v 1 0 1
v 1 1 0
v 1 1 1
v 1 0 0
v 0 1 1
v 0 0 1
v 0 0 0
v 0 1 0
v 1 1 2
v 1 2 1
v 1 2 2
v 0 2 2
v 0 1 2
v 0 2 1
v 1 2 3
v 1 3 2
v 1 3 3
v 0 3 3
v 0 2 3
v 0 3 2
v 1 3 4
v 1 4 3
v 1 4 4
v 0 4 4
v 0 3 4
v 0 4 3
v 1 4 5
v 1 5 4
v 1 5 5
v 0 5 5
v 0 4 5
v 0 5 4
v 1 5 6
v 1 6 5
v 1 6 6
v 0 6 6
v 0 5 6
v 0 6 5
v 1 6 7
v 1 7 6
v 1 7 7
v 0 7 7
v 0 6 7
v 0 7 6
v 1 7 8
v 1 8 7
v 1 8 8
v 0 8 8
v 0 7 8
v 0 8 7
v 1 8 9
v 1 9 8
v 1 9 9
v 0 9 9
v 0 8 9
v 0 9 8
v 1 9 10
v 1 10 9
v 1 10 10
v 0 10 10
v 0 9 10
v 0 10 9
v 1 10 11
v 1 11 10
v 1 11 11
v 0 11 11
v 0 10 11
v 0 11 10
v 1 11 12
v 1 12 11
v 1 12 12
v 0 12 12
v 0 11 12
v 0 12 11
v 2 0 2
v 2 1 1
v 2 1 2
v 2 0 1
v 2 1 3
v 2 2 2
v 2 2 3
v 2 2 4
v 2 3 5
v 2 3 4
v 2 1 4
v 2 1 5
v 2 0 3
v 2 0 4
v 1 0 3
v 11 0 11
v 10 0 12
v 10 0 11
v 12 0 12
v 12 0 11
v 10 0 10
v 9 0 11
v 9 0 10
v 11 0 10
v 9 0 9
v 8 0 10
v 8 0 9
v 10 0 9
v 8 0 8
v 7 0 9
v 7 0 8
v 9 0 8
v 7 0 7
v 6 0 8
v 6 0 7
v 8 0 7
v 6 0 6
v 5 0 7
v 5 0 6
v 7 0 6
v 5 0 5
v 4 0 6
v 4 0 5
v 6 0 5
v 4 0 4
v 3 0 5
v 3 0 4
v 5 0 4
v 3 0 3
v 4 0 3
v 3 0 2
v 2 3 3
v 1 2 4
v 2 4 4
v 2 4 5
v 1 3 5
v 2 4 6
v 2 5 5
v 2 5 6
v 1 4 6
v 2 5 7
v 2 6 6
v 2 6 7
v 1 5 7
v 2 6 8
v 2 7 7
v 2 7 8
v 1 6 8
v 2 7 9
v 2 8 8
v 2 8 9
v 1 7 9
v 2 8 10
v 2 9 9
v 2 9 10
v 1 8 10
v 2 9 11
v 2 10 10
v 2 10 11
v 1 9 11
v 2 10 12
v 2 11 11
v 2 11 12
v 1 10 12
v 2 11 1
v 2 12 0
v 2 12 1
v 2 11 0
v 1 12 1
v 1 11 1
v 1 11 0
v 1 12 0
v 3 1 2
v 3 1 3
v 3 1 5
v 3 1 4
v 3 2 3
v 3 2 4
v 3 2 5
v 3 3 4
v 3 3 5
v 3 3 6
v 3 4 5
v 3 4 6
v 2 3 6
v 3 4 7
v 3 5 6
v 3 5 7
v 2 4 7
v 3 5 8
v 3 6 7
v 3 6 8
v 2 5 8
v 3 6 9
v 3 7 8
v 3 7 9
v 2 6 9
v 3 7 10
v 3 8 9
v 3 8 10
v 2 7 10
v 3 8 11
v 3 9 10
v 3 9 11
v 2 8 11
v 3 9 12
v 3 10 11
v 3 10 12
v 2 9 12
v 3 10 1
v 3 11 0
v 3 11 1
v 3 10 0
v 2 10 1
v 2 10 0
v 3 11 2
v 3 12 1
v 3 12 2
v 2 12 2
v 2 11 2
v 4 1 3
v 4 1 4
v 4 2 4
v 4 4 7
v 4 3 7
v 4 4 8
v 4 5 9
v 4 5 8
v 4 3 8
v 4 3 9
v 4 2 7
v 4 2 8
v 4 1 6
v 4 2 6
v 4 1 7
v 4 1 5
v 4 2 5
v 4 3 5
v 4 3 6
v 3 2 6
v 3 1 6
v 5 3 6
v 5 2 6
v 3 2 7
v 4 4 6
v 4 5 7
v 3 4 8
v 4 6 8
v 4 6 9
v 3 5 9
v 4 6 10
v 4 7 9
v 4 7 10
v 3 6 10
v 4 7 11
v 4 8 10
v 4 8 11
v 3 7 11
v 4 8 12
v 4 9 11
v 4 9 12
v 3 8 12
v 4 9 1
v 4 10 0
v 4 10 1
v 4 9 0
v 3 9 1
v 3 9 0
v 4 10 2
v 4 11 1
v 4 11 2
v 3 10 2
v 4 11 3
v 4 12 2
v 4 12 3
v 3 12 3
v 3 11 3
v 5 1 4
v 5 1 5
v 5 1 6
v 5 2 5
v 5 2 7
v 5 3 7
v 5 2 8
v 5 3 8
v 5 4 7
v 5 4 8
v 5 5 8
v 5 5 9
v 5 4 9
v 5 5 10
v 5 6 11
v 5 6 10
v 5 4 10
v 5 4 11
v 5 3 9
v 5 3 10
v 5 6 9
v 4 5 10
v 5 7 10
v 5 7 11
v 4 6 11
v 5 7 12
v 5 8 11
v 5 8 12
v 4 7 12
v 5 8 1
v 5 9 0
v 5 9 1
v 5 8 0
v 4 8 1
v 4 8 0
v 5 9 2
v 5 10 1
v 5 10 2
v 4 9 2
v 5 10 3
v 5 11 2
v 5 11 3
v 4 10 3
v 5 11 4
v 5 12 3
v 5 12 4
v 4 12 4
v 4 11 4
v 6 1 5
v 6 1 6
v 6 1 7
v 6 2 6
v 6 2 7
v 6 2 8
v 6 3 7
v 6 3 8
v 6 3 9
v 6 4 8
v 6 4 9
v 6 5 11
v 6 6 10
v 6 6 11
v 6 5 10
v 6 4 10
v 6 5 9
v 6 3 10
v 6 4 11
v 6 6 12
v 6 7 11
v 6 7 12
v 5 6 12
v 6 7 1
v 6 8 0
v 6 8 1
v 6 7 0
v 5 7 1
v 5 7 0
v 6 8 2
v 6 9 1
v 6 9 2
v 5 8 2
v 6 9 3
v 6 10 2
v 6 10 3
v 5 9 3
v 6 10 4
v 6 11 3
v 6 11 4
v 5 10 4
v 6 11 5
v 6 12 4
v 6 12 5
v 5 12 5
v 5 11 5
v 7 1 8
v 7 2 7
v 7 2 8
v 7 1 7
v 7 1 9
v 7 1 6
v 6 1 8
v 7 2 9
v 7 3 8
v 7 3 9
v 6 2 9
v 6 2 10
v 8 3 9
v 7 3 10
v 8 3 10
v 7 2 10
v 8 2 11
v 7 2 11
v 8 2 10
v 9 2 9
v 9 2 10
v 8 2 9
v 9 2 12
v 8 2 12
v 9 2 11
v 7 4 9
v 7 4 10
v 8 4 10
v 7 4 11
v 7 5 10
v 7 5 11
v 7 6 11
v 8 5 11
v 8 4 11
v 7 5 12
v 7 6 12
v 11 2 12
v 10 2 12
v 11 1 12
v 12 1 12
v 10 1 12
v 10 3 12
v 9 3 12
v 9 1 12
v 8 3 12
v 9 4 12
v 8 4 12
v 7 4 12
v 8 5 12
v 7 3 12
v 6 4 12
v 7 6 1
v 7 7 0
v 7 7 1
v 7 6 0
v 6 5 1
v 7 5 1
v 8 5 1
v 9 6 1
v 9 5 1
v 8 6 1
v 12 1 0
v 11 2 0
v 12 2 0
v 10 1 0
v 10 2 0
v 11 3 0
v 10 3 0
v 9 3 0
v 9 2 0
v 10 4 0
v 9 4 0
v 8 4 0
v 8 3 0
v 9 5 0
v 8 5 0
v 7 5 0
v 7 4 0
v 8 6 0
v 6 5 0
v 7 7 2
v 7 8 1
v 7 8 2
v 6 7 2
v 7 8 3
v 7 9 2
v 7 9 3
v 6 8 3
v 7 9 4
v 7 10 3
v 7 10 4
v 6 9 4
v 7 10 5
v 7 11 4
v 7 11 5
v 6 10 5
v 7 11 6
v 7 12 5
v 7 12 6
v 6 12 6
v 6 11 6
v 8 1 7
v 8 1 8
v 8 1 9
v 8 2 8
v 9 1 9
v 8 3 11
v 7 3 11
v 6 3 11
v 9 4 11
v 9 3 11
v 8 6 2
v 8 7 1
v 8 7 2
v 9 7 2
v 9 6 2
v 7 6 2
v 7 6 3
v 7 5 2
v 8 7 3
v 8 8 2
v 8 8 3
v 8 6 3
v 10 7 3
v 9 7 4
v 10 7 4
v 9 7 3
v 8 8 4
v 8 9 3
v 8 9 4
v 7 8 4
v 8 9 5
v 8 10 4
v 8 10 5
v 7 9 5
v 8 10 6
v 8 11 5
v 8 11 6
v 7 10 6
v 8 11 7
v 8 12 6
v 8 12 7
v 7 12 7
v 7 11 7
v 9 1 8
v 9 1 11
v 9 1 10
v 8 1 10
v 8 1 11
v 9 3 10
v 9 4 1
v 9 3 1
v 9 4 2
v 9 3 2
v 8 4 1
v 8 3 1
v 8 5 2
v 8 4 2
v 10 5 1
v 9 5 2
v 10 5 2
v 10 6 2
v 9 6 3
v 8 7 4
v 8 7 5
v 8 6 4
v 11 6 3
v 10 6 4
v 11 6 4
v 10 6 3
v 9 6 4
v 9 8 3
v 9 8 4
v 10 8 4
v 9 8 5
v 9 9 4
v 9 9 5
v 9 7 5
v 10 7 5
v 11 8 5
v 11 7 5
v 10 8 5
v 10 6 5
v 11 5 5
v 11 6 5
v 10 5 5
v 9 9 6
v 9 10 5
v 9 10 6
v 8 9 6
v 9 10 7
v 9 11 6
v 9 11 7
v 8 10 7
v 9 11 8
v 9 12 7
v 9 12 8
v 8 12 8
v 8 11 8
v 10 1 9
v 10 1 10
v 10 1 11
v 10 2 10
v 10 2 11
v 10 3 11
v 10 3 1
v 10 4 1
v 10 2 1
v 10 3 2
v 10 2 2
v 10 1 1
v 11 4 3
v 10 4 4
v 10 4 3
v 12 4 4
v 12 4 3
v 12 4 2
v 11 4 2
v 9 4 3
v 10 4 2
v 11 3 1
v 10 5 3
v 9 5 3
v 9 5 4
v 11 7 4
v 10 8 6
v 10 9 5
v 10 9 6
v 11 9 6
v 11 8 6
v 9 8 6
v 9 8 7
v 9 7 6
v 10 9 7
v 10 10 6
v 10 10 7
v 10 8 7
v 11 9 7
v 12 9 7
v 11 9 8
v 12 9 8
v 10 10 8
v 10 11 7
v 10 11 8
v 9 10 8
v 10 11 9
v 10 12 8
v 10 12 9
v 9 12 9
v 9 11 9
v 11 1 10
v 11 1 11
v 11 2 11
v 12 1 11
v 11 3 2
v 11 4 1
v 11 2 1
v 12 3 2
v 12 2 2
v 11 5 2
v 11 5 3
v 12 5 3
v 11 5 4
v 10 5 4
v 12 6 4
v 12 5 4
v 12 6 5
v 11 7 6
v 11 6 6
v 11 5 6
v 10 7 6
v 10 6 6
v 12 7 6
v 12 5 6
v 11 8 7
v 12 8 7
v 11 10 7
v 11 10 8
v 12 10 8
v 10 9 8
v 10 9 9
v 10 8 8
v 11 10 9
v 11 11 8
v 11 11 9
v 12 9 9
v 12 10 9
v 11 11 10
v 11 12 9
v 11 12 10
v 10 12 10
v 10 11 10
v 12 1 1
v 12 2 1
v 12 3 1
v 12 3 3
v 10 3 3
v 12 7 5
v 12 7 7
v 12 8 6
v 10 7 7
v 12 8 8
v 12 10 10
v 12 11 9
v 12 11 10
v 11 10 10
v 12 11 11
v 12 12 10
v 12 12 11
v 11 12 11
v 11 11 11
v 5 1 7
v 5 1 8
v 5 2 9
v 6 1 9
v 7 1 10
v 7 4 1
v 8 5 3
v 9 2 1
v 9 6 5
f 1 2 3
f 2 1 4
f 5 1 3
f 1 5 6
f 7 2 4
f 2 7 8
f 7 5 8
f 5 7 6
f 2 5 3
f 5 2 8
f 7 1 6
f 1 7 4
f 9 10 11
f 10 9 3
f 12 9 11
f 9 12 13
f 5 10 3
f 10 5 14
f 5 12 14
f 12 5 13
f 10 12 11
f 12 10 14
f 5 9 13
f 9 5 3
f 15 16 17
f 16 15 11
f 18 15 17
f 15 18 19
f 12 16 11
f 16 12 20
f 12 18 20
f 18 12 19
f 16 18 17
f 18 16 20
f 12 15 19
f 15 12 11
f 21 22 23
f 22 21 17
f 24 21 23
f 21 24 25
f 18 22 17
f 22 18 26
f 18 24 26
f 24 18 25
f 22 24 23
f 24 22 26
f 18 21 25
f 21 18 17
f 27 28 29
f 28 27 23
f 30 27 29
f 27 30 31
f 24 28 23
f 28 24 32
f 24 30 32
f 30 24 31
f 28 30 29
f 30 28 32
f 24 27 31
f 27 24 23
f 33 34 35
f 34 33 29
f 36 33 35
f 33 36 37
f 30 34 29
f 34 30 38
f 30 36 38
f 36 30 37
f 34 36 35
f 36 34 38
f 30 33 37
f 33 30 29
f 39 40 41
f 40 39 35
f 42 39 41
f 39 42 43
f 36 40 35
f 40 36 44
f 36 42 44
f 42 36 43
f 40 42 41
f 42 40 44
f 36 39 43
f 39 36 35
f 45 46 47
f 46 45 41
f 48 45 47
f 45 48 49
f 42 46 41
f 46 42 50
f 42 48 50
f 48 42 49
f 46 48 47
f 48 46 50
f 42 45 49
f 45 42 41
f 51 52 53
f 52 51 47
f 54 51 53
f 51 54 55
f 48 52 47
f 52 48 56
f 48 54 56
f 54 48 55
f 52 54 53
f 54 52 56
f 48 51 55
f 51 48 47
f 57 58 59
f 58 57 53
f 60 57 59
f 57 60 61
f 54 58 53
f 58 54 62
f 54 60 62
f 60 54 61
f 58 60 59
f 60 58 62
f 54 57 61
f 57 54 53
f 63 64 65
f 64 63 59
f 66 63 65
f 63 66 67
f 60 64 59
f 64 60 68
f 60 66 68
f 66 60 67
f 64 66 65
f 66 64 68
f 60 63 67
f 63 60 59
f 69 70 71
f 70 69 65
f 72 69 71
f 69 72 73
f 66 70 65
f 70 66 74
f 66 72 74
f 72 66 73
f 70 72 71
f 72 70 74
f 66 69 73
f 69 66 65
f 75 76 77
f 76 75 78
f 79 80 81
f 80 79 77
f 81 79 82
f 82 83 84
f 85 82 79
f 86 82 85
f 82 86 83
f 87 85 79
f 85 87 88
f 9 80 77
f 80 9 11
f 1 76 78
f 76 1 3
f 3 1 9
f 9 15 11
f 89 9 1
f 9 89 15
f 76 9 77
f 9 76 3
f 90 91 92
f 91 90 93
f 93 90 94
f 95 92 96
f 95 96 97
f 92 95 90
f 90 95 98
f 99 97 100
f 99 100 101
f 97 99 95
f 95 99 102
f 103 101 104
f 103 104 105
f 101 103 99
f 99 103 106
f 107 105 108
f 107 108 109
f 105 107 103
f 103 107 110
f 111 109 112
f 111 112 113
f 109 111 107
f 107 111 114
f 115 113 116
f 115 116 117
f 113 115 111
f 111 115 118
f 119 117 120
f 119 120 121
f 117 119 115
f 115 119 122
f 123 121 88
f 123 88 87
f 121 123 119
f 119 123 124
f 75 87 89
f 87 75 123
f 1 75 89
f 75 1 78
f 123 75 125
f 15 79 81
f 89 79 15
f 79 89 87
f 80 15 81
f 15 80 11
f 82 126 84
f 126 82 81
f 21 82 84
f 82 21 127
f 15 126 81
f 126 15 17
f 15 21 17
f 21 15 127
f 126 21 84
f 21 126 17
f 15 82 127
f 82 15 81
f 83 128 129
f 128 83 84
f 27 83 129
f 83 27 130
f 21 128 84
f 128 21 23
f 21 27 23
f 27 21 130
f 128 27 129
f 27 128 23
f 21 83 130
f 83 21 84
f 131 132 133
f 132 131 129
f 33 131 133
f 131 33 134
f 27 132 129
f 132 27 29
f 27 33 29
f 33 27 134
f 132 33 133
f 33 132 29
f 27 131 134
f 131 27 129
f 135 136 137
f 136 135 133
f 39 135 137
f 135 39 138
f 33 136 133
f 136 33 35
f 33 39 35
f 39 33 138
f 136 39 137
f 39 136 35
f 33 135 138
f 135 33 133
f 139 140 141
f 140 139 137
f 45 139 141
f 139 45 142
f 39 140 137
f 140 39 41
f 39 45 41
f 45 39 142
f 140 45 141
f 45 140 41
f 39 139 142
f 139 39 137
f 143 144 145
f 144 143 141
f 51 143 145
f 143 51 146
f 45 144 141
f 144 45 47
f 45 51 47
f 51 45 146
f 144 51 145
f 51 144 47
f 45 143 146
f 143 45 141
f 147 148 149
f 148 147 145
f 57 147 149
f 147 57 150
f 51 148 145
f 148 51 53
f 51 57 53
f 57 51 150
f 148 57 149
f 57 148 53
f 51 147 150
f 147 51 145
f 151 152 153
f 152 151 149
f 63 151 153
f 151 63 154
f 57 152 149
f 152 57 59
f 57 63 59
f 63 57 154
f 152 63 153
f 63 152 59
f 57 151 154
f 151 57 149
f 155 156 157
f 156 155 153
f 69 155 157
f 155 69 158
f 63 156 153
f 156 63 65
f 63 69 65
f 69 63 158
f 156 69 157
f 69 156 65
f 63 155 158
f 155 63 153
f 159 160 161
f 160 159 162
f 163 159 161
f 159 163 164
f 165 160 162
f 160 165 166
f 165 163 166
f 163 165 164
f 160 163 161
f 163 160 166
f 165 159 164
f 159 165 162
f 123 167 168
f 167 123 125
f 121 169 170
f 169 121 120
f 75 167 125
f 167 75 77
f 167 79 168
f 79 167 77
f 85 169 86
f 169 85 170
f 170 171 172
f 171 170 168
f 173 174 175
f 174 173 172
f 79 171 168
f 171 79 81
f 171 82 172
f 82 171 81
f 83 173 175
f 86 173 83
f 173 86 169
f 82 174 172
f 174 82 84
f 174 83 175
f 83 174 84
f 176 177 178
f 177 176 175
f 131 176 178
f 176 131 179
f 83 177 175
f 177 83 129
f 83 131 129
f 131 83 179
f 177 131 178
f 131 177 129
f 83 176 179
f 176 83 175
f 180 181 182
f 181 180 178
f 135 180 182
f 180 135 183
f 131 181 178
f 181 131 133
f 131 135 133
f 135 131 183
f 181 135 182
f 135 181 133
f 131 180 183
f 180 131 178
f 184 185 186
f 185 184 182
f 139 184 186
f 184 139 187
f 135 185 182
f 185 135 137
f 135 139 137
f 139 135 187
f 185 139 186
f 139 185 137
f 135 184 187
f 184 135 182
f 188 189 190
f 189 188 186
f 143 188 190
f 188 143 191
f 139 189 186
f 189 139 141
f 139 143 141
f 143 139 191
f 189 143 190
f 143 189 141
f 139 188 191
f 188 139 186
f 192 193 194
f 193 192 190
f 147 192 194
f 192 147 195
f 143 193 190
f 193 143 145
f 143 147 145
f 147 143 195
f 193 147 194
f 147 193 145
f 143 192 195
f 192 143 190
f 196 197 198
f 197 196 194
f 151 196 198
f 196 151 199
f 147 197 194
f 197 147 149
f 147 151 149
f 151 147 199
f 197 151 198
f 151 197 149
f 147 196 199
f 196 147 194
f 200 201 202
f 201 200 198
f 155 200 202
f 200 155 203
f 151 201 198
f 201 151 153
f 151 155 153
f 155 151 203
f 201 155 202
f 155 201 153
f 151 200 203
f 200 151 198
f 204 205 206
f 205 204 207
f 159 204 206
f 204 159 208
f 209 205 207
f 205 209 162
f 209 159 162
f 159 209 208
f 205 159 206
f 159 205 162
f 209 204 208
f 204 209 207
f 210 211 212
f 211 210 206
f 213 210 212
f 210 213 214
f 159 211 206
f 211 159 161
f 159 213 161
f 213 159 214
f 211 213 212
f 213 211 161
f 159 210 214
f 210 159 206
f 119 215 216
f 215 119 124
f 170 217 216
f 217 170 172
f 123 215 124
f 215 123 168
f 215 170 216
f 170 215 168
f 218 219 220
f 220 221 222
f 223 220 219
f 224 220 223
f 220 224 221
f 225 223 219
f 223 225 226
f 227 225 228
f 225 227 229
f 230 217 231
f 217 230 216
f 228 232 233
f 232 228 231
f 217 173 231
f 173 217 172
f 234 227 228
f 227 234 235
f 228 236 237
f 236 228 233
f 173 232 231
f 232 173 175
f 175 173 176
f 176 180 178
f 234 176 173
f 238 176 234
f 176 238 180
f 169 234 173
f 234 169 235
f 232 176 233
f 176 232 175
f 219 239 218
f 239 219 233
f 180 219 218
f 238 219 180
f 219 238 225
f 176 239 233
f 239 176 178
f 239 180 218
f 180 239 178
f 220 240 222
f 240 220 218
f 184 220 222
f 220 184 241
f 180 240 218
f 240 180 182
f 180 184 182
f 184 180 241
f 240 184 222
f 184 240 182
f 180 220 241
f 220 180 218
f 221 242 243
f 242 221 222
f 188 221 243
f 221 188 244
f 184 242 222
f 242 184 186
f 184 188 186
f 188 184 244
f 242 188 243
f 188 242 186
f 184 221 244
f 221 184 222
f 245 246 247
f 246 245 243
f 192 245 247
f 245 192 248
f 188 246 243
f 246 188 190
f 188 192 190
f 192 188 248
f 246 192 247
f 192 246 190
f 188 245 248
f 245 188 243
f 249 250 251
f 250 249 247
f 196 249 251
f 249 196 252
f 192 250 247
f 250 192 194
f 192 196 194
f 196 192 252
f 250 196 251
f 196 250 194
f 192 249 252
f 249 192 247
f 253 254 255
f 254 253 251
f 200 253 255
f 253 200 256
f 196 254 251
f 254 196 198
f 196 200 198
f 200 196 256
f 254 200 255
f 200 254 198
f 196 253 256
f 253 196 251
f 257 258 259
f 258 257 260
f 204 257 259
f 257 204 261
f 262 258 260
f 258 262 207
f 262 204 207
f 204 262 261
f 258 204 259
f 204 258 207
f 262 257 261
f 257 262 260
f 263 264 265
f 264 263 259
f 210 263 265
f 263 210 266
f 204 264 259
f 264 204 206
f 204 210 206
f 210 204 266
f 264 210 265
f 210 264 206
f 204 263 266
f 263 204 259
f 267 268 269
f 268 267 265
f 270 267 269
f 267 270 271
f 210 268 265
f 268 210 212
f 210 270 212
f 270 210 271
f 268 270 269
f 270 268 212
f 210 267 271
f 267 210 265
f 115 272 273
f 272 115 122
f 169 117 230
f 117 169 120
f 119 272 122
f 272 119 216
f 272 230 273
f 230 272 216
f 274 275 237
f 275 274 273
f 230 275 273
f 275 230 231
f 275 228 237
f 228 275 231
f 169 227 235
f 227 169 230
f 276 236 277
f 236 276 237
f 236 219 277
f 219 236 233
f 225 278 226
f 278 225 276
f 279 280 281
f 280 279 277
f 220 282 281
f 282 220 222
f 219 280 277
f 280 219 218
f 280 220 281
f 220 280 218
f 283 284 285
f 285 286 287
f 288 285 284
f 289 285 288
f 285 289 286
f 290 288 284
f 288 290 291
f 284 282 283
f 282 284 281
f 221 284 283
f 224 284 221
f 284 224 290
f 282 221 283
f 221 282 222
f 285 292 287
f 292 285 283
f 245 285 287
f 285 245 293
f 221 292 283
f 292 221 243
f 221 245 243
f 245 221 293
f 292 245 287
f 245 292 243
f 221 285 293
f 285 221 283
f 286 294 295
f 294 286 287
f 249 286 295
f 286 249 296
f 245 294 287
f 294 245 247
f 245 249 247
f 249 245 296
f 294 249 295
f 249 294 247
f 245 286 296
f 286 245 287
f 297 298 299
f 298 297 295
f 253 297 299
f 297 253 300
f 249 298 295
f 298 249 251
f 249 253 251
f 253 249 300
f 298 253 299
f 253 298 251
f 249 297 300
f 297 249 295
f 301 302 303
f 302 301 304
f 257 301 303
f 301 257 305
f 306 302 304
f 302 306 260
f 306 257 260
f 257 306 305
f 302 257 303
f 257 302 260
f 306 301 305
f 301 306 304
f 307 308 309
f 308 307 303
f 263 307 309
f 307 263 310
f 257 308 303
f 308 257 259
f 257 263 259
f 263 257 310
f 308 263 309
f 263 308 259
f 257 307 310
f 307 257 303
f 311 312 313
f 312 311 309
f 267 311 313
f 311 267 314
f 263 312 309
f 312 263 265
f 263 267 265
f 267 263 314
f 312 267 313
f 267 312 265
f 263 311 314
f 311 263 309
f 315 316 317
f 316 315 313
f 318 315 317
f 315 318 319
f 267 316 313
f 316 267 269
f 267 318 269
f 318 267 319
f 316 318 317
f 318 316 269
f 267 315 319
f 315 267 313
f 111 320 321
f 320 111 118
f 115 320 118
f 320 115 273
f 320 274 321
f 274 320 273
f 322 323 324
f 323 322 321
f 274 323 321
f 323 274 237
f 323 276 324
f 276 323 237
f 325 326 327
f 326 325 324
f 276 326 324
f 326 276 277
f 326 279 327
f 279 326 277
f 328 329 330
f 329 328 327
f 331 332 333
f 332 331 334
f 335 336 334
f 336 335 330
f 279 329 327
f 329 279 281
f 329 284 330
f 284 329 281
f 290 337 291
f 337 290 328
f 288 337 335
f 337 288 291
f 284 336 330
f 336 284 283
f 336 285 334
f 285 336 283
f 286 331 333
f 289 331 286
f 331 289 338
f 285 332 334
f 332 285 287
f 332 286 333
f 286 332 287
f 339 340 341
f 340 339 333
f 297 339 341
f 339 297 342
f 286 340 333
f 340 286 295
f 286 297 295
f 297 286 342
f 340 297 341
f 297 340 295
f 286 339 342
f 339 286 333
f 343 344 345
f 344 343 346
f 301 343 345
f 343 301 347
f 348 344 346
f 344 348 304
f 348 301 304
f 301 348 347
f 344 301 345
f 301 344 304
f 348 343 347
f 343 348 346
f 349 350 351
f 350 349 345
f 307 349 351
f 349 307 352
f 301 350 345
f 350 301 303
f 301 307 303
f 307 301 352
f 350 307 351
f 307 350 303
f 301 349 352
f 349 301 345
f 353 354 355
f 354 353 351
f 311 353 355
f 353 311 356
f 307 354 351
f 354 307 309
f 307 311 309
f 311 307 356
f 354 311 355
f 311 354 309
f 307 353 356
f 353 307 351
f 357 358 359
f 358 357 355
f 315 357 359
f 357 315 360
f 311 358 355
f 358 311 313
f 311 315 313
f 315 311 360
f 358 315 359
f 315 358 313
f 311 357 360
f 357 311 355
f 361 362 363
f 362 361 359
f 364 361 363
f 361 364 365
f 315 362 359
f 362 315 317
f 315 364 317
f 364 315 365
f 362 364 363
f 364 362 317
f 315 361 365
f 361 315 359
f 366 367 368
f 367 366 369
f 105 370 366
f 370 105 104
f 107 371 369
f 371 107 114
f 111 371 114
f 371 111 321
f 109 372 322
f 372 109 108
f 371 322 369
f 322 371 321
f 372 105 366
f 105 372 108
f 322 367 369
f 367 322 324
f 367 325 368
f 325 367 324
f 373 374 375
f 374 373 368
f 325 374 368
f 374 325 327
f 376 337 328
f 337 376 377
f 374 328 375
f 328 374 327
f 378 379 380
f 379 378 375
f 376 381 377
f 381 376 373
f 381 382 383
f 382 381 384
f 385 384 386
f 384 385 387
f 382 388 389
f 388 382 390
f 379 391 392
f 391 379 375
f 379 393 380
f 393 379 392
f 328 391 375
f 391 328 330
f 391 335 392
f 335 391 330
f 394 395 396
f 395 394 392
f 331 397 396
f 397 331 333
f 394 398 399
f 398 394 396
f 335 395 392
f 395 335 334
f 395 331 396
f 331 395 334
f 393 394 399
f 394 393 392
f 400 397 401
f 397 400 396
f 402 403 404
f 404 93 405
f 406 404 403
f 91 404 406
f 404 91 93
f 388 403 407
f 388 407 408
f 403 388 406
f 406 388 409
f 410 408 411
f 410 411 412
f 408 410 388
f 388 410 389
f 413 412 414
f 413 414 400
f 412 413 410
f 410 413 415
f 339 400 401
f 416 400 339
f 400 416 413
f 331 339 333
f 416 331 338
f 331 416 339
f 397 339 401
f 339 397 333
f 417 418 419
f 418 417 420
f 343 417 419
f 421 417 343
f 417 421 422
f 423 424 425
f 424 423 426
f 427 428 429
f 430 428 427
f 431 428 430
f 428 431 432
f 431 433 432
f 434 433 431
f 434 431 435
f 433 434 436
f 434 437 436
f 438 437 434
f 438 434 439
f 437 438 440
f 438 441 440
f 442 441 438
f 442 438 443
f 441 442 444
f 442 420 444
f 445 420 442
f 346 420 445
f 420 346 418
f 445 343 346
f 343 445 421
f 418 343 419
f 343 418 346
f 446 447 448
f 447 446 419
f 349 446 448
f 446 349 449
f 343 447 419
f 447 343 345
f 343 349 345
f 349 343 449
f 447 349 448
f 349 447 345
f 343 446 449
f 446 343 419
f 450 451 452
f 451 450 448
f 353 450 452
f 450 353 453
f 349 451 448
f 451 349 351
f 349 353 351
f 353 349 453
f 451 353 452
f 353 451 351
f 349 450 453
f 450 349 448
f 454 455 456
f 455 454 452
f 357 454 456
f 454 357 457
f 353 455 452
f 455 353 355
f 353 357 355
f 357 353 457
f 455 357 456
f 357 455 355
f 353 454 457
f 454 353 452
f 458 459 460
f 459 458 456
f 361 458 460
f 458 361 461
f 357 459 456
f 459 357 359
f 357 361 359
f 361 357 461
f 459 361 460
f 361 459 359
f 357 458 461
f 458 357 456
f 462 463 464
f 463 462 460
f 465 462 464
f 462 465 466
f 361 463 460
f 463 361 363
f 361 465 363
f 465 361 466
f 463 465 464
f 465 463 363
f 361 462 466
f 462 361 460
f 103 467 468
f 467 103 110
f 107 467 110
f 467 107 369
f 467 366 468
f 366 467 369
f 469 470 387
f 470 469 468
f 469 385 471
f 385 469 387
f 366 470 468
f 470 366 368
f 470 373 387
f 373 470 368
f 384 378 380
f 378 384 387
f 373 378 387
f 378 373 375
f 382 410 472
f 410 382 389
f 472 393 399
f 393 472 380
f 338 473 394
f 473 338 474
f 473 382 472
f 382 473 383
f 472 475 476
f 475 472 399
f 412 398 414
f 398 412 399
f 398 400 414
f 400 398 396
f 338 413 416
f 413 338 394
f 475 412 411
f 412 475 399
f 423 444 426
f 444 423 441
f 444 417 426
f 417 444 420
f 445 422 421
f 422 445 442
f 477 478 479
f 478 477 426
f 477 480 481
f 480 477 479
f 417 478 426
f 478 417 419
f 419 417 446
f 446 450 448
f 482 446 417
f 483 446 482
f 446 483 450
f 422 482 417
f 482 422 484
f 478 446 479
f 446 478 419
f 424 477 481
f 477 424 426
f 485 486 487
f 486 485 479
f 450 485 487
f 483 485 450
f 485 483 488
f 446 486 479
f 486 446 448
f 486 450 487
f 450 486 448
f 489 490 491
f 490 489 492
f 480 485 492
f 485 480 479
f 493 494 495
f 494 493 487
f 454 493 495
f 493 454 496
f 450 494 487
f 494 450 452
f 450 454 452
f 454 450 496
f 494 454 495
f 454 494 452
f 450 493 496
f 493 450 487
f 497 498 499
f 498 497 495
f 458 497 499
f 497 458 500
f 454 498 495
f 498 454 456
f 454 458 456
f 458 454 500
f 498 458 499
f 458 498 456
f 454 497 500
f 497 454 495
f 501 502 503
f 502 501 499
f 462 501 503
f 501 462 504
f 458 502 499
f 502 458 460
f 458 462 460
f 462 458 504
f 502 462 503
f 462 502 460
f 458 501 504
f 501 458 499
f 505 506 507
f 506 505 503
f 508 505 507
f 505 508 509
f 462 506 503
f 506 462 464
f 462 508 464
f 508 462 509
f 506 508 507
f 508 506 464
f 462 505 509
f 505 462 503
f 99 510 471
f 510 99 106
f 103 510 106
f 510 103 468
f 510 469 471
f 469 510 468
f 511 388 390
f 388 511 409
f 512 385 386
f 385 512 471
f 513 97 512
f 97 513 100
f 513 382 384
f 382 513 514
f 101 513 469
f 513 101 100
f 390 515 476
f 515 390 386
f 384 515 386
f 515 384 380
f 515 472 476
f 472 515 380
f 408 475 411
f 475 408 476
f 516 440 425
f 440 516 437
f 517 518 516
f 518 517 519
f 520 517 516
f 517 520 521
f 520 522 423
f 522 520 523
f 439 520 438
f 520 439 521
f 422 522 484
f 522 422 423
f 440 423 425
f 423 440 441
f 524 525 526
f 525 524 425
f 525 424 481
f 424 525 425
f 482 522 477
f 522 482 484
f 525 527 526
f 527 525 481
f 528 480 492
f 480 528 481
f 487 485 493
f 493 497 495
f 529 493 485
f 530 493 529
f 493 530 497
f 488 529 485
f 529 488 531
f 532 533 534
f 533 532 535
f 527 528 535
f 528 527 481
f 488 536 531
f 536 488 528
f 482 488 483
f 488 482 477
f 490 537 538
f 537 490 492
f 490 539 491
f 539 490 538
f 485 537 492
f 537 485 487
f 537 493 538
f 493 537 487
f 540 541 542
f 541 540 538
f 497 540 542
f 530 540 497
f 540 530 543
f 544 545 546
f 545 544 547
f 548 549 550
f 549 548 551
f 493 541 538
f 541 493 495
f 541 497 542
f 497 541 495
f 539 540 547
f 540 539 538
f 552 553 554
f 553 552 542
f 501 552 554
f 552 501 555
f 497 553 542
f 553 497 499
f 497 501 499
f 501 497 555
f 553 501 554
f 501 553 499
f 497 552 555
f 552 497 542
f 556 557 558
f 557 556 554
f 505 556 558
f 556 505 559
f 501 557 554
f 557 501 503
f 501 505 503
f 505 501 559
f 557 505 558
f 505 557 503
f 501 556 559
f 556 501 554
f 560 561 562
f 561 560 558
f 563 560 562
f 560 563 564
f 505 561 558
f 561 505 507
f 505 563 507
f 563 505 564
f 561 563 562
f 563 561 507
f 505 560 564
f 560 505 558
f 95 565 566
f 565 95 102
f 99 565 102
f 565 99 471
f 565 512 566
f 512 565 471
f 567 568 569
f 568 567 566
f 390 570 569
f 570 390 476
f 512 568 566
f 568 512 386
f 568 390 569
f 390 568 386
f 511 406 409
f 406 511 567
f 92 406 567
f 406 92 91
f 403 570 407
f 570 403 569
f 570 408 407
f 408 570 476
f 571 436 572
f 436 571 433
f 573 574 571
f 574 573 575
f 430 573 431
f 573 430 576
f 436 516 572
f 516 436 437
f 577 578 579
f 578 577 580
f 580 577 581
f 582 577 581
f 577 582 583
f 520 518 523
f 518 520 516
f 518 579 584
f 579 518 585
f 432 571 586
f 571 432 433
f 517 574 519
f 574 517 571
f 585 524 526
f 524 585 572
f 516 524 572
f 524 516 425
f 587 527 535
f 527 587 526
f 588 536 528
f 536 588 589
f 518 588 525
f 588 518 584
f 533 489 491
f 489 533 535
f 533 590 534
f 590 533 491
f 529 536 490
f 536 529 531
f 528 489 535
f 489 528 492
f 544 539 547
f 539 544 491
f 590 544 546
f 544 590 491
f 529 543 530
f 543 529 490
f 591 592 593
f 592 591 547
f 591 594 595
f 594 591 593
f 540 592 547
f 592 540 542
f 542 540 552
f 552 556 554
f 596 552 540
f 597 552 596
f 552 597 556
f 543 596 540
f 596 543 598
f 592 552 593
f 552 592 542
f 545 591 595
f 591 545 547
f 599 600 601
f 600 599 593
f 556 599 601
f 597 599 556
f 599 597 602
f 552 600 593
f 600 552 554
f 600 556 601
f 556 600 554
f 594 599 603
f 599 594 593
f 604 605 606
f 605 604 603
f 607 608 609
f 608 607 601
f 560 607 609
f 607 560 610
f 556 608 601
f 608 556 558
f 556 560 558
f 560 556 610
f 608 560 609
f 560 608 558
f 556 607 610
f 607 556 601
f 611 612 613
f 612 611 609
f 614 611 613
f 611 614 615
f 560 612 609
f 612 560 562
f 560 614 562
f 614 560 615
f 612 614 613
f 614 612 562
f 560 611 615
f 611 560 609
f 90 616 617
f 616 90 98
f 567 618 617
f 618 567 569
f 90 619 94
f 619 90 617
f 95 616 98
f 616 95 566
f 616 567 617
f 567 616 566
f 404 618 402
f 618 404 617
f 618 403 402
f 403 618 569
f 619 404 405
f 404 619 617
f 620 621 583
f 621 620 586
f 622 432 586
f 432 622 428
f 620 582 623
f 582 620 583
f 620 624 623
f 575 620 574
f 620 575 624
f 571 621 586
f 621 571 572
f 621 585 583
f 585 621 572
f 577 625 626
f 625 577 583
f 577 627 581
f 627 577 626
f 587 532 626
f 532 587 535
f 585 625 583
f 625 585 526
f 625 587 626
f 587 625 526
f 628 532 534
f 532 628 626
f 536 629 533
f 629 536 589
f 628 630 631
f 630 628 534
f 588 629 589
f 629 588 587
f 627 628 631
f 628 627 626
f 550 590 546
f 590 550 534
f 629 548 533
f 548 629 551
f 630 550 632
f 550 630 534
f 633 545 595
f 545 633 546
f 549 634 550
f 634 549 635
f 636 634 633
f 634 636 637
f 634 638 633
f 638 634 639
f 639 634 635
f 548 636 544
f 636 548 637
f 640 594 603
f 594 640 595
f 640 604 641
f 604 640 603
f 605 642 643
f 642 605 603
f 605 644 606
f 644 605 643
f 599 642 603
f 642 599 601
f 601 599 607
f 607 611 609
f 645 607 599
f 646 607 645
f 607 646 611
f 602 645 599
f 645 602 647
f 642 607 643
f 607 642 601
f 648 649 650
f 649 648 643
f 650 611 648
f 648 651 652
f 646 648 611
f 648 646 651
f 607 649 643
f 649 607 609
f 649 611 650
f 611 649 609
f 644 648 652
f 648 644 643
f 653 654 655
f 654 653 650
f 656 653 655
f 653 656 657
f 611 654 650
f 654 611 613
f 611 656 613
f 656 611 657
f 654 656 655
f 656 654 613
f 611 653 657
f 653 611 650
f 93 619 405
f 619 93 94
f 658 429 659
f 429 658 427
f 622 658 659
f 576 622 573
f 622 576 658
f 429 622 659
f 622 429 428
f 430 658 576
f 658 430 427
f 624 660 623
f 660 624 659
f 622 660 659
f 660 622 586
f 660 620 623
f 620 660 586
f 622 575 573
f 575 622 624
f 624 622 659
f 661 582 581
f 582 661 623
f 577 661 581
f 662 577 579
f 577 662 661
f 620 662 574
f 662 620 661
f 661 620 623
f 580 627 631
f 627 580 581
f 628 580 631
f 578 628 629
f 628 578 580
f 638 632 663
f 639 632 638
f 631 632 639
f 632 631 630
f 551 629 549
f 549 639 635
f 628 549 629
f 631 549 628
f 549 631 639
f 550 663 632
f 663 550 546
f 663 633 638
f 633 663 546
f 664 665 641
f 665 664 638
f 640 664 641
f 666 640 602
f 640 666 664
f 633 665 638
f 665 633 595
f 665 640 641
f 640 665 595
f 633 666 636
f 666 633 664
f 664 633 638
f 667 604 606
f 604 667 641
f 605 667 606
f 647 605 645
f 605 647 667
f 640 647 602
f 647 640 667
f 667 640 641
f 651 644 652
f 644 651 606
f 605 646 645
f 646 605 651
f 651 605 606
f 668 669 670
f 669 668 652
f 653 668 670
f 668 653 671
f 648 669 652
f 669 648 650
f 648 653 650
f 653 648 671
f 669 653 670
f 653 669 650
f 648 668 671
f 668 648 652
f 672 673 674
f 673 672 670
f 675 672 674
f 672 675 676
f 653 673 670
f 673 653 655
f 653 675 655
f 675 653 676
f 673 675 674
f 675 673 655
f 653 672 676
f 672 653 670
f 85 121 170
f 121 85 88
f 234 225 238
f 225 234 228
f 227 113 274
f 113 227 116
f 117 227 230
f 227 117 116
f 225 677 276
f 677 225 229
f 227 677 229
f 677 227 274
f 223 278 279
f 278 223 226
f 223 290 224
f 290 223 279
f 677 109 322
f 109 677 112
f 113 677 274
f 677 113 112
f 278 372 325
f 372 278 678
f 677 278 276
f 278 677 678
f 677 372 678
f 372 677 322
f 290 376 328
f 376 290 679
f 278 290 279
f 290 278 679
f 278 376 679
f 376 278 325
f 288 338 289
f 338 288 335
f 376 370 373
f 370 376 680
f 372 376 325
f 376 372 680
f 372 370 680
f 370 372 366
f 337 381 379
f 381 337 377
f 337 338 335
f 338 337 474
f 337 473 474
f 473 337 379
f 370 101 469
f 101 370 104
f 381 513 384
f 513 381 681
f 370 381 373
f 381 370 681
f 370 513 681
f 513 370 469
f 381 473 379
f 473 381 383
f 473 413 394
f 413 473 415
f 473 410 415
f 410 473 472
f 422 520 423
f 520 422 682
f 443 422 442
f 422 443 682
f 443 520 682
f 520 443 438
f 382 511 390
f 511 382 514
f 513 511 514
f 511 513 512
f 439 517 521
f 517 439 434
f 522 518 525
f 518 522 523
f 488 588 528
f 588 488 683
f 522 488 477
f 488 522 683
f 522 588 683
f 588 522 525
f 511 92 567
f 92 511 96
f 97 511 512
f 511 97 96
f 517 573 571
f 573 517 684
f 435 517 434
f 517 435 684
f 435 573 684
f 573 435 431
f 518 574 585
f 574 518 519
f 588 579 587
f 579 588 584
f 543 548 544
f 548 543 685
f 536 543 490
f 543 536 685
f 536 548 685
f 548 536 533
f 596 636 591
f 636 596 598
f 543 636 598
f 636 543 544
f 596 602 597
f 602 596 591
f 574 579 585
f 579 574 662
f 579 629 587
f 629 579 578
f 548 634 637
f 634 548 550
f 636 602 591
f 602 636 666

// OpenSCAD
union() {
    translate([0, 0, 0]) cube([1, 1, 1]);
    translate([0, 1, 1]) cube([1, 1, 1]);
    translate([0, 2, 2]) cube([1, 1, 1]);
    translate([0, 3, 3]) cube([1, 1, 1]);
    translate([0, 4, 4]) cube([1, 1, 1]);
    translate([0, 5, 5]) cube([1, 1, 1]);
    translate([0, 6, 6]) cube([1, 1, 1]);
    translate([0, 7, 7]) cube([1, 1, 1]);
    translate([0, 8, 8]) cube([1, 1, 1]);
    translate([0, 9, 9]) cube([1, 1, 1]);
    translate([0, 10, 10]) cube([1, 1, 1]);
    translate([0, 11, 11]) cube([1, 1, 1]);
    translate([1, 0, 1]) cube([1, 1, 1]);
    translate([1, 1, 2]) cube([1, 1, 1]);
    translate([1, 2, 3]) cube([1, 1, 1]);
    translate([1, 3, 4]) cube([1, 1, 1]);
    translate([1, 4, 5]) cube([1, 1, 1]);
    translate([1, 5, 6]) cube([1, 1, 1]);
    translate([1, 6, 7]) cube([1, 1, 1]);
    translate([1, 7, 8]) cube([1, 1, 1]);
    translate([1, 8, 9]) cube([1, 1, 1]);
    translate([1, 9, 10]) cube([1, 1, 1]);
    translate([1, 10, 11]) cube([1, 1, 1]);
    translate([1, 11, 0]) cube([1, 1, 1]);
    translate([2, 0, 2]) cube([1, 1, 1]);
    translate([2, 1, 3]) cube([1, 1, 1]);
    translate([2, 2, 4]) cube([1, 1, 1]);
    translate([2, 3, 5]) cube([1, 1, 1]);
    translate([2, 4, 6]) cube([1, 1, 1]);
    translate([2, 5, 7]) cube([1, 1, 1]);
    translate([2, 6, 8]) cube([1, 1, 1]);
    translate([2, 7, 9]) cube([1, 1, 1]);
    translate([2, 8, 10]) cube([1, 1, 1]);
    translate([2, 9, 11]) cube([1, 1, 1]);
    translate([2, 10, 0]) cube([1, 1, 1]);
    translate([2, 11, 1]) cube([1, 1, 1]);
    translate([3, 0, 3]) cube([1, 1, 1]);
    translate([3, 1, 4]) cube([1, 1, 1]);
    translate([3, 2, 5]) cube([1, 1, 1]);
    translate([3, 3, 6]) cube([1, 1, 1]);
    translate([3, 4, 7]) cube([1, 1, 1]);
    translate([3, 5, 8]) cube([1, 1, 1]);
    translate([3, 6, 9]) cube([1, 1, 1]);
    translate([3, 7, 10]) cube([1, 1, 1]);
    translate([3, 8, 11]) cube([1, 1, 1]);
    translate([3, 9, 0]) cube([1, 1, 1]);
    translate([3, 10, 1]) cube([1, 1, 1]);
    translate([3, 11, 2]) cube([1, 1, 1]);
    translate([4, 0, 4]) cube([1, 1, 1]);
    translate([4, 1, 5]) cube([1, 1, 1]);
    translate([4, 2, 6]) cube([1, 1, 1]);
    translate([4, 3, 7]) cube([1, 1, 1]);
    translate([4, 4, 8]) cube([1, 1, 1]);
    translate([4, 5, 9]) cube([1, 1, 1]);
    translate([4, 6, 10]) cube([1, 1, 1]);
    translate([4, 7, 11]) cube([1, 1, 1]);
    translate([4, 8, 0]) cube([1, 1, 1]);
    translate([4, 9, 1]) cube([1, 1, 1]);
    translate([4, 10, 2]) cube([1, 1, 1]);
    translate([4, 11, 3]) cube([1, 1, 1]);
    translate([5, 0, 5]) cube([1, 1, 1]);
    translate([5, 1, 6]) cube([1, 1, 1]);
    translate([5, 2, 7]) cube([1, 1, 1]);
    translate([5, 3, 8]) cube([1, 1, 1]);
    translate([5, 4, 9]) cube([1, 1, 1]);
    translate([5, 5, 10]) cube([1, 1, 1]);
    translate([5, 6, 11]) cube([1, 1, 1]);
    translate([5, 7, 0]) cube([1, 1, 1]);
    translate([5, 8, 1]) cube([1, 1, 1]);
    translate([5, 9, 2]) cube([1, 1, 1]);
    translate([5, 10, 3]) cube([1, 1, 1]);
    translate([5, 11, 4]) cube([1, 1, 1]);
    translate([6, 0, 6]) cube([1, 1, 1]);
    translate([6, 1, 7]) cube([1, 1, 1]);
    translate([6, 2, 8]) cube([1, 1, 1]);
    translate([6, 3, 9]) cube([1, 1, 1]);
    translate([6, 4, 10]) cube([1, 1, 1]);
    translate([6, 5, 11]) cube([1, 1, 1]);
    translate([6, 6, 0]) cube([1, 1, 1]);
    translate([6, 7, 1]) cube([1, 1, 1]);
    translate([6, 8, 2]) cube([1, 1, 1]);
    translate([6, 9, 3]) cube([1, 1, 1]);
    translate([6, 10, 4]) cube([1, 1, 1]);
    translate([6, 11, 5]) cube([1, 1, 1]);
    translate([7, 0, 7]) cube([1, 1, 1]);
    translate([7, 1, 8]) cube([1, 1, 1]);
    translate([7, 2, 9]) cube([1, 1, 1]);
    translate([7, 3, 10]) cube([1, 1, 1]);
    translate([7, 4, 11]) cube([1, 1, 1]);
    translate([7, 5, 0]) cube([1, 1, 1]);
    translate([7, 6, 1]) cube([1, 1, 1]);
    translate([7, 7, 2]) cube([1, 1, 1]);
    translate([7, 8, 3]) cube([1, 1, 1]);
    translate([7, 9, 4]) cube([1, 1, 1]);
    translate([7, 10, 5]) cube([1, 1, 1]);
    translate([7, 11, 6]) cube([1, 1, 1]);
    translate([8, 0, 8]) cube([1, 1, 1]);
    translate([8, 1, 9]) cube([1, 1, 1]);
    translate([8, 2, 10]) cube([1, 1, 1]);
    translate([8, 3, 11]) cube([1, 1, 1]);
    translate([8, 4, 0]) cube([1, 1, 1]);
    translate([8, 5, 1]) cube([1, 1, 1]);
    translate([8, 6, 2]) cube([1, 1, 1]);
    translate([8, 7, 3]) cube([1, 1, 1]);
    translate([8, 8, 4]) cube([1, 1, 1]);
    translate([8, 9, 5]) cube([1, 1, 1]);
    translate([8, 10, 6]) cube([1, 1, 1]);
    translate([8, 11, 7]) cube([1, 1, 1]);
    translate([9, 0, 9]) cube([1, 1, 1]);
    translate([9, 1, 10]) cube([1, 1, 1]);
    translate([9, 2, 11]) cube([1, 1, 1]);
    translate([9, 3, 0]) cube([1, 1, 1]);
    translate([9, 4, 1]) cube([1, 1, 1]);
    translate([9, 5, 2]) cube([1, 1, 1]);
    translate([9, 6, 3]) cube([1, 1, 1]);
    translate([9, 7, 4]) cube([1, 1, 1]);
    translate([9, 8, 5]) cube([1, 1, 1]);
    translate([9, 9, 6]) cube([1, 1, 1]);
    translate([9, 10, 7]) cube([1, 1, 1]);
    translate([9, 11, 8]) cube([1, 1, 1]);
    translate([10, 0, 10]) cube([1, 1, 1]);
    translate([10, 1, 11]) cube([1, 1, 1]);
    translate([10, 2, 0]) cube([1, 1, 1]);
    translate([10, 3, 1]) cube([1, 1, 1]);
    translate([10, 4, 2]) cube([1, 1, 1]);
    translate([10, 5, 3]) cube([1, 1, 1]);
    translate([10, 6, 4]) cube([1, 1, 1]);
    translate([10, 7, 5]) cube([1, 1, 1]);
    translate([10, 8, 6]) cube([1, 1, 1]);
    translate([10, 9, 7]) cube([1, 1, 1]);
    translate([10, 10, 8]) cube([1, 1, 1]);
    translate([10, 11, 9]) cube([1, 1, 1]);
    translate([11, 0, 11]) cube([1, 1, 1]);
    translate([11, 1, 0]) cube([1, 1, 1]);
    translate([11, 2, 1]) cube([1, 1, 1]);
    translate([11, 3, 2]) cube([1, 1, 1]);
    translate([11, 4, 3]) cube([1, 1, 1]);
    translate([11, 5, 4]) cube([1, 1, 1]);
    translate([11, 6, 5]) cube([1, 1, 1]);
    translate([11, 7, 6]) cube([1, 1, 1]);
    translate([11, 8, 7]) cube([1, 1, 1]);
    translate([11, 9, 8]) cube([1, 1, 1]);
    translate([11, 10, 9]) cube([1, 1, 1]);
    translate([11, 11, 10]) cube([1, 1, 1]);
    translate([1, 0, 2]) cube([1, 1, 1]);
    translate([2, 0, 3]) cube([1, 1, 1]);
    translate([2, 1, 4]) cube([1, 1, 1]);
    translate([3, 0, 4]) cube([1, 1, 1]);
    translate([3, 1, 5]) cube([1, 1, 1]);
    translate([3, 2, 6]) cube([1, 1, 1]);
    translate([4, 0, 5]) cube([1, 1, 1]);
    translate([4, 1, 6]) cube([1, 1, 1]);
    translate([4, 2, 7]) cube([1, 1, 1]);
    translate([4, 3, 8]) cube([1, 1, 1]);
    translate([5, 0, 6]) cube([1, 1, 1]);
    translate([5, 1, 7]) cube([1, 1, 1]);
    translate([5, 2, 8]) cube([1, 1, 1]);
    translate([5, 3, 9]) cube([1, 1, 1]);
    translate([5, 4, 10]) cube([1, 1, 1]);
    translate([6, 0, 7]) cube([1, 1, 1]);
    translate([6, 1, 8]) cube([1, 1, 1]);
    translate([6, 2, 9]) cube([1, 1, 1]);
    translate([6, 3, 10]) cube([1, 1, 1]);
    translate([6, 4, 11]) cube([1, 1, 1]);
    translate([6, 5, 0]) cube([1, 1, 1]);
    translate([7, 0, 8]) cube([1, 1, 1]);
    translate([7, 1, 9]) cube([1, 1, 1]);
    translate([7, 2, 10]) cube([1, 1, 1]);
    translate([7, 3, 11]) cube([1, 1, 1]);
    translate([7, 4, 0]) cube([1, 1, 1]);
    translate([7, 5, 1]) cube([1, 1, 1]);
    translate([7, 6, 2]) cube([1, 1, 1]);
    translate([8, 0, 9]) cube([1, 1, 1]);
    translate([8, 1, 10]) cube([1, 1, 1]);
    translate([8, 2, 11]) cube([1, 1, 1]);
    translate([8, 3, 0]) cube([1, 1, 1]);
    translate([8, 4, 1]) cube([1, 1, 1]);
    translate([8, 5, 2]) cube([1, 1, 1]);
    translate([8, 6, 3]) cube([1, 1, 1]);
    translate([8, 7, 4]) cube([1, 1, 1]);
    translate([9, 0, 10]) cube([1, 1, 1]);
    translate([9, 1, 11]) cube([1, 1, 1]);
    translate([9, 2, 0]) cube([1, 1, 1]);
    translate([9, 3, 1]) cube([1, 1, 1]);
    translate([9, 4, 2]) cube([1, 1, 1]);
    translate([9, 5, 3]) cube([1, 1, 1]);
    translate([9, 6, 4]) cube([1, 1, 1]);
    translate([9, 7, 5]) cube([1, 1, 1]);
    translate([9, 8, 6]) cube([1, 1, 1]);
    translate([10, 0, 11]) cube([1, 1, 1]);
    translate([10, 1, 0]) cube([1, 1, 1]);
    translate([10, 2, 1]) cube([1, 1, 1]);
    translate([10, 3, 2]) cube([1, 1, 1]);
    translate([10, 4, 3]) cube([1, 1, 1]);
    translate([10, 5, 4]) cube([1, 1, 1]);
    translate([10, 6, 5]) cube([1, 1, 1]);
    translate([10, 7, 6]) cube([1, 1, 1]);
    translate([10, 8, 7]) cube([1, 1, 1]);
    translate([10, 9, 8]) cube([1, 1, 1]);
    translate([11, 5, 5]) cube([1, 1, 1]);
}
